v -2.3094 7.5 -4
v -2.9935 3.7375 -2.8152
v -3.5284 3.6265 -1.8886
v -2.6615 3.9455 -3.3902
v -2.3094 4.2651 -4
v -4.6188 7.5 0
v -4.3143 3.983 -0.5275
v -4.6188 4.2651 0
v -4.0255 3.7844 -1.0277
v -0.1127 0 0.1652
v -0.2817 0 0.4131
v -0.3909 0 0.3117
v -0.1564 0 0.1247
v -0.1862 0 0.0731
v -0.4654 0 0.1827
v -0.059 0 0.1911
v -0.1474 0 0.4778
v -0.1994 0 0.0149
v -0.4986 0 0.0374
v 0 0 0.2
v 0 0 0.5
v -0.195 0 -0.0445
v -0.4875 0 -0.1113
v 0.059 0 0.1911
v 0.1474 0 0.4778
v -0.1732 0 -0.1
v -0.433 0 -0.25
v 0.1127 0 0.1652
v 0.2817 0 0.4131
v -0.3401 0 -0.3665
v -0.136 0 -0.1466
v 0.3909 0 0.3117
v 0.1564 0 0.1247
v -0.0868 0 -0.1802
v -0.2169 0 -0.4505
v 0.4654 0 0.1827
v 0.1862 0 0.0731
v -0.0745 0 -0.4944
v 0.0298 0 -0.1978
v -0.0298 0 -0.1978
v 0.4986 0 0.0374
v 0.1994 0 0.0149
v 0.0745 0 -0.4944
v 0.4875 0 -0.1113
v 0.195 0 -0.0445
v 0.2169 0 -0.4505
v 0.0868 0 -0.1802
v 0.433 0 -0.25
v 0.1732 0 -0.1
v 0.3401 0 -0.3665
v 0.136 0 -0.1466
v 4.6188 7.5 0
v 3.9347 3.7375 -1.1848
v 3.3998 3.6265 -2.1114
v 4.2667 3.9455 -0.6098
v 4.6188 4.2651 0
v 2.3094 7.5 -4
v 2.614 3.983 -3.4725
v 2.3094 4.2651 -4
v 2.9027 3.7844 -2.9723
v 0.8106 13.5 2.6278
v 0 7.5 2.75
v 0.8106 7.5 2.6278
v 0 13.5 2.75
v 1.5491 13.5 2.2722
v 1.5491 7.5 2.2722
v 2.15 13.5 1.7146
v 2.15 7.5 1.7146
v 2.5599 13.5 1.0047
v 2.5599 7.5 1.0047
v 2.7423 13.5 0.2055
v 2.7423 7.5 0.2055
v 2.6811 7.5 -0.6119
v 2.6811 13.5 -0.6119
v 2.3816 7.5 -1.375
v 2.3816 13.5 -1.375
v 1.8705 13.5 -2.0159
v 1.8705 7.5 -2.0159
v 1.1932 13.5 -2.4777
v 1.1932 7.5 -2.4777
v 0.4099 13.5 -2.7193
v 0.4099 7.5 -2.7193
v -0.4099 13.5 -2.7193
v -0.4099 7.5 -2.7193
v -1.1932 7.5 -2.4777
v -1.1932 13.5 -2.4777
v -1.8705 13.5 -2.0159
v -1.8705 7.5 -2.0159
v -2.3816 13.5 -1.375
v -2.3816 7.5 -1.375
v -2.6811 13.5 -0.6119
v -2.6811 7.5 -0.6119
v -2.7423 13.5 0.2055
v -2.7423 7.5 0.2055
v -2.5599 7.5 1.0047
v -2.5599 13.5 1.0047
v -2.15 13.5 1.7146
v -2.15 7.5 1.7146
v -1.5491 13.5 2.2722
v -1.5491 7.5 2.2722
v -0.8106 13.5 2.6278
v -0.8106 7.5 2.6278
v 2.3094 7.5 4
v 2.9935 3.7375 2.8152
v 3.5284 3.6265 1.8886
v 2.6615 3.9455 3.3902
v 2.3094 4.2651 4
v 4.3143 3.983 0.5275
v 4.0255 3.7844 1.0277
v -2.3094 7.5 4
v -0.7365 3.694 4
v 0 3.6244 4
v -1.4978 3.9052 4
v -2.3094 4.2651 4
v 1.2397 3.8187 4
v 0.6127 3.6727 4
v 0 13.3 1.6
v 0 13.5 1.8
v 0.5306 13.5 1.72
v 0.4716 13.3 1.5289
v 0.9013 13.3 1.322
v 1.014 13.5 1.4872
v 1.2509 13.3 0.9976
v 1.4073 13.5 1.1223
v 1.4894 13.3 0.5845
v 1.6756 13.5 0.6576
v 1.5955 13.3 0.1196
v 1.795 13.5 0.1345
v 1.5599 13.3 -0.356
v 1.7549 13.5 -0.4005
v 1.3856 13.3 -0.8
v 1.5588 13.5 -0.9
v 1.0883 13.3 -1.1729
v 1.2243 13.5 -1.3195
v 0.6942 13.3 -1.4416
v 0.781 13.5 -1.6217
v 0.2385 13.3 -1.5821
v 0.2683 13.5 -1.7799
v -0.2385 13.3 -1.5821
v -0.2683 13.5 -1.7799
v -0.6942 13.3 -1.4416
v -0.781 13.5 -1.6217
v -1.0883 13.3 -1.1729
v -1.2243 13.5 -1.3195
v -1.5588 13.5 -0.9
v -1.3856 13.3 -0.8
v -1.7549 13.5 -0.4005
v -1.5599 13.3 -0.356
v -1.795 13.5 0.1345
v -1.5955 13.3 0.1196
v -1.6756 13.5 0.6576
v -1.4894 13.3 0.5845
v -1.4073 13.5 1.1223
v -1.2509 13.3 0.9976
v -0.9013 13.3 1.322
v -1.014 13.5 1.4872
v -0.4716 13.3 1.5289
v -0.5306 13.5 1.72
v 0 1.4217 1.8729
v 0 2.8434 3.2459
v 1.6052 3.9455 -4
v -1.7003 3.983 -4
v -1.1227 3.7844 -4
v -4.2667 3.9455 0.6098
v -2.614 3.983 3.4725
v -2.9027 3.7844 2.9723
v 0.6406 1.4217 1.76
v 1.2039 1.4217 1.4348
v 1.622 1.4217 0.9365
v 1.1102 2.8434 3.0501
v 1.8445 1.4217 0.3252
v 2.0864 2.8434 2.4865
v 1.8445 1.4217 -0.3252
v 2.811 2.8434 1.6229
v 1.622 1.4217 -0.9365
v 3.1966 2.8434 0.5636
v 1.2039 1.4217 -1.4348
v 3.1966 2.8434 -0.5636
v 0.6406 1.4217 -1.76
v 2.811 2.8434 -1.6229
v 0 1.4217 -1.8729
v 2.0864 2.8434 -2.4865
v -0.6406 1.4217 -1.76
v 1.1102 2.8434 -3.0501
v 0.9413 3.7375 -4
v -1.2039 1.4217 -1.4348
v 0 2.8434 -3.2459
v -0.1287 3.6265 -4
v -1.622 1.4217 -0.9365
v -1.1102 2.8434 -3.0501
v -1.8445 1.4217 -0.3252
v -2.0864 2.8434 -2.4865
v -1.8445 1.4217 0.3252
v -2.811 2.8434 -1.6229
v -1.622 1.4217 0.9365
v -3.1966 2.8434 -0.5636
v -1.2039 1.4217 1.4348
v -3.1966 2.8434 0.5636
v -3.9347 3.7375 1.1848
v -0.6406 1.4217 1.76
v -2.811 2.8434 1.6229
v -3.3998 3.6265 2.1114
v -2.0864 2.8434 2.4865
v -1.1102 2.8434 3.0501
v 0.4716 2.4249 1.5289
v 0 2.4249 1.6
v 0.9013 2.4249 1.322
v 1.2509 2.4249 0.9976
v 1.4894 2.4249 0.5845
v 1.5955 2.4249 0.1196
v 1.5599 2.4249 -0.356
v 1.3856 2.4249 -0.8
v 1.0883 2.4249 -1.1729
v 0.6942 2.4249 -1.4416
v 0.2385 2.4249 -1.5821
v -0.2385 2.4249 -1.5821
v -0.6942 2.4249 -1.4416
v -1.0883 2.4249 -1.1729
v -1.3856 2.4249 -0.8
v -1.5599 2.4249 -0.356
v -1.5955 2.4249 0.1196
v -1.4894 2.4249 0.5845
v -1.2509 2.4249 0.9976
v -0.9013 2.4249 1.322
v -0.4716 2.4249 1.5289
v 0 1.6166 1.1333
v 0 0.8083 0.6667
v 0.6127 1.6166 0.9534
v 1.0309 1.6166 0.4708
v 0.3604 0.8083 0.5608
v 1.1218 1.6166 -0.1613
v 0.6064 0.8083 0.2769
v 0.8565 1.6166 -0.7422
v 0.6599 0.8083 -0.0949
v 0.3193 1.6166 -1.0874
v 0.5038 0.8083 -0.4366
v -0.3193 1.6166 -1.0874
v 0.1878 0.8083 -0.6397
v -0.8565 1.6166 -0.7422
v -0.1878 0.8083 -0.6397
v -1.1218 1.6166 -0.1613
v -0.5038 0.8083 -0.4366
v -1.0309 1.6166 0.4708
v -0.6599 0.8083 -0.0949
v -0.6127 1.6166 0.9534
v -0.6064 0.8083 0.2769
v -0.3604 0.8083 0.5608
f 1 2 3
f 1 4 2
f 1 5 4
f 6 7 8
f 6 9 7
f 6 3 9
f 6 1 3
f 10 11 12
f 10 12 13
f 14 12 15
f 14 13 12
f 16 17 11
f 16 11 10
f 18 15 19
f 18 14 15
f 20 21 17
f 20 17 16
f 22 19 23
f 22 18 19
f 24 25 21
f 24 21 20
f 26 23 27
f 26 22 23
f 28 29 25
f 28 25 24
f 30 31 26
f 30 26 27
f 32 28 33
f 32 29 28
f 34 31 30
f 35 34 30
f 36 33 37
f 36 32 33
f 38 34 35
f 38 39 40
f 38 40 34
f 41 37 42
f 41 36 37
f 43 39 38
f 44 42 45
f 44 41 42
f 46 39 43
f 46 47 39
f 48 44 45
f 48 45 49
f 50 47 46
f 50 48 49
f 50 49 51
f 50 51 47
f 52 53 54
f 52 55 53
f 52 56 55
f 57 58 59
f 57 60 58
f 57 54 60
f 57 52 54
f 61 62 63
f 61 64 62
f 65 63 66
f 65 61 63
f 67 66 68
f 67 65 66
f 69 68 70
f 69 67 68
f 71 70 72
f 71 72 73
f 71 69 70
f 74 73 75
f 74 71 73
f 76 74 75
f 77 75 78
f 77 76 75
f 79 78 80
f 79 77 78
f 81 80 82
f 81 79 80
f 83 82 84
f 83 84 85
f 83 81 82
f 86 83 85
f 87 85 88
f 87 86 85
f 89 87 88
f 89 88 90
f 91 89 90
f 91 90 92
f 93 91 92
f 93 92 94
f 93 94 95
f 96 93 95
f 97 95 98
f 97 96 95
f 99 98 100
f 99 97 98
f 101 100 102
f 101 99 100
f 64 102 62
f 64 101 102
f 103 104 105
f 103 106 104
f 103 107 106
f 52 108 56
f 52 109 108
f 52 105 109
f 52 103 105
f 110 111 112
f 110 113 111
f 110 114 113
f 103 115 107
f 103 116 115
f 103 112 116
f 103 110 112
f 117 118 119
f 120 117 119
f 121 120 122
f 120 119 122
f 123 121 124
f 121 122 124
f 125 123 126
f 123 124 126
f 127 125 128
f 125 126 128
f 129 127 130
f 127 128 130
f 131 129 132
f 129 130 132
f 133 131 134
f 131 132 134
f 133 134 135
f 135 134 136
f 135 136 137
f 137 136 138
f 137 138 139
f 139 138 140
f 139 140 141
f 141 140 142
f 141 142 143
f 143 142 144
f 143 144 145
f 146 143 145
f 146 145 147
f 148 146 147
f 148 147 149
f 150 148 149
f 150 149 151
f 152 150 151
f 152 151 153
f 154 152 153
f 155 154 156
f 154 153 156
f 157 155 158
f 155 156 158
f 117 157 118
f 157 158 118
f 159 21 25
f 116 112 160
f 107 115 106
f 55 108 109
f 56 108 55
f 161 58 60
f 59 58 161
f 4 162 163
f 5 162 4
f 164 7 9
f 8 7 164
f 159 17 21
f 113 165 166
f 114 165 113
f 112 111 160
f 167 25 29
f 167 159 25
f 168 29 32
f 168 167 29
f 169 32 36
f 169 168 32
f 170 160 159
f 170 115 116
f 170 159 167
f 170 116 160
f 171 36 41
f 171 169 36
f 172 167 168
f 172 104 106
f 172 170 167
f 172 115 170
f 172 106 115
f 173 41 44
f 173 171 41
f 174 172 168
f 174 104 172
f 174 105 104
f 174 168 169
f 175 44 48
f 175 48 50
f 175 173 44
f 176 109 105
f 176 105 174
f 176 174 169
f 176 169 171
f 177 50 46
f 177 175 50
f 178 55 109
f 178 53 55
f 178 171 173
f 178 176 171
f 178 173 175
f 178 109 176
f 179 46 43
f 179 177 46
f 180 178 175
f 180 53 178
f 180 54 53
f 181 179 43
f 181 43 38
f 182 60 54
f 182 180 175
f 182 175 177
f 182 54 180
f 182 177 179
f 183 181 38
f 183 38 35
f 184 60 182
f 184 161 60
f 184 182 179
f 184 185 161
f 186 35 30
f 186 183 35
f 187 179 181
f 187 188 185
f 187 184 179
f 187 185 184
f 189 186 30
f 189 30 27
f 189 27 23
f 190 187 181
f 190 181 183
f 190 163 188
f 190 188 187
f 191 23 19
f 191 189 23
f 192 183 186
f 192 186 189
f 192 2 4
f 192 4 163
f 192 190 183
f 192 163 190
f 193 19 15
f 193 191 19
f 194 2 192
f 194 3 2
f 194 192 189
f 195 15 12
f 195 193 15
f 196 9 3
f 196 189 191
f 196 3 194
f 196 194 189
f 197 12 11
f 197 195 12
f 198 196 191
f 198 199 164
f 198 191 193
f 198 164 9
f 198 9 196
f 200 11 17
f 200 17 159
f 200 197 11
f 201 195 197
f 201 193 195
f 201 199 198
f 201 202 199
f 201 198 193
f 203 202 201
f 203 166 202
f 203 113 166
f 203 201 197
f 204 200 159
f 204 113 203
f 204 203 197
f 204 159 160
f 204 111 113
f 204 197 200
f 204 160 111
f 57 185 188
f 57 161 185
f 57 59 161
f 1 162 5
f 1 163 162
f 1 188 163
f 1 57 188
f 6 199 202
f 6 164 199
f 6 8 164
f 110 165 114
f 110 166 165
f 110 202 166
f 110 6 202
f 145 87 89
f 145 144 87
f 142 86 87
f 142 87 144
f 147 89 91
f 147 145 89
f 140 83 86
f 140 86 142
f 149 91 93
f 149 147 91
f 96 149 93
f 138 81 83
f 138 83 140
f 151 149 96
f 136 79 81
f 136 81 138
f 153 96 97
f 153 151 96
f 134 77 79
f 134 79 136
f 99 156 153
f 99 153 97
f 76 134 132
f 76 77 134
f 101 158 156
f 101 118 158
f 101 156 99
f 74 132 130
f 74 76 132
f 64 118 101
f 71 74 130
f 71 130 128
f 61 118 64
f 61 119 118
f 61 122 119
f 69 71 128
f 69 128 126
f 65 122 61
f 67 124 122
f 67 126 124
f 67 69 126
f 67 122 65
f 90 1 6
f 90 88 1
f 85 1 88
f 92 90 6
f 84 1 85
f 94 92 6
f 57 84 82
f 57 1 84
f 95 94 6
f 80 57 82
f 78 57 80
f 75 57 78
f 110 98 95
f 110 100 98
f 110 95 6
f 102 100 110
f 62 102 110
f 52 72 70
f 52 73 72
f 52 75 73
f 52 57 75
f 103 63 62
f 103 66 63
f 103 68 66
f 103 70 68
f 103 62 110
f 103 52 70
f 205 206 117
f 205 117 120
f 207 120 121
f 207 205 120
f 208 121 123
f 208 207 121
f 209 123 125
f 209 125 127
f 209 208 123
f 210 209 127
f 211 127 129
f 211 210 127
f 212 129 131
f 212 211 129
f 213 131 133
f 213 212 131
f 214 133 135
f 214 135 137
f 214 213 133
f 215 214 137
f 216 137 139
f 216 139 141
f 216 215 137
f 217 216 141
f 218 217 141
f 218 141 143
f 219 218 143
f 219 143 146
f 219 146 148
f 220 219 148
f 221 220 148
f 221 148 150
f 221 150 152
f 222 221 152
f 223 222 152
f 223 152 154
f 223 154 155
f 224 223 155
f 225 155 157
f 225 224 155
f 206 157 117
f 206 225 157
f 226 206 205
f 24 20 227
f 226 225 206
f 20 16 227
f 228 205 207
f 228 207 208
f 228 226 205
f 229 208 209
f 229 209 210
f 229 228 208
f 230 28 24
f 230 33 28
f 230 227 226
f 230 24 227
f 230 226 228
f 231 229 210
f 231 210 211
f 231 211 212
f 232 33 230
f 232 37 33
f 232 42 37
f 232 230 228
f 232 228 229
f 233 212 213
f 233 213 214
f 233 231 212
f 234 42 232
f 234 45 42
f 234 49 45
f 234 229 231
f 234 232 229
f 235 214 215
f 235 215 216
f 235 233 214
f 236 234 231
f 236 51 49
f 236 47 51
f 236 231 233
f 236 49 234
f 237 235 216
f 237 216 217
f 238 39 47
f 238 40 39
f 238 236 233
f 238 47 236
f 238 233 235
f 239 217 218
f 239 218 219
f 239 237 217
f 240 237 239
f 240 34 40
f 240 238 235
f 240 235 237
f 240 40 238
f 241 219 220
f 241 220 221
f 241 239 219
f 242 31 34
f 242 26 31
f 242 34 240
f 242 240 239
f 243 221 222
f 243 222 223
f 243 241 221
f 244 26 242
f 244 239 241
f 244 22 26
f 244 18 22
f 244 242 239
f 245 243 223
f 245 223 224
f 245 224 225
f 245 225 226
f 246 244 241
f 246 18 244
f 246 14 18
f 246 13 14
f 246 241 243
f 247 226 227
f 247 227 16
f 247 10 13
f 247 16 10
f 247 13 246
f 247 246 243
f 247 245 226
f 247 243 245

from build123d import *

# Parameters (mm, degrees)
CROQUIS2_R            = 7.742665811
CORTAR_EXTRUIR1_DEPTH = 14.272066445
CHAFL_N1_SIZE         = 0.2


with BuildPart() as part:
    # Croquis1 → Revolución1 (revolve)
    with BuildSketch(Plane.XY, mode=Mode.PRIVATE) as revoluci_n1_sk:
        Polygon((0.2, 0), (0.5, 0), (7.742665811, 7.5), (2.75, 7.5), (2.75, 13.5), (1.6, 13.5), (1.6, 2.424871131), align=None)
    revolve(revoluci_n1_sk.sketch.rotate(Axis((0, 0, 0), (0, 1, 0)), 270), axis=Axis((0, 0, 0), (0, 1, 0)))

    # Croquis2 → Cortar-Extruir1 (cut, through all)
    with BuildSketch(Plane(origin=(0, 7.5, 0), x_dir=(1, 0, 0), z_dir=(0, 1, 0))):
        Circle(CROQUIS2_R)
        Polygon((2.309401077, 4), (-2.309401077, 4), (-4.618802154, 0), (-2.309401077, -4), (2.309401077, -4), (4.618802154, 0), align=None, mode=Mode.SUBTRACT)
    extrude(amount=-CORTAR_EXTRUIR1_DEPTH, mode=Mode.SUBTRACT)

    # Chaflán1
    chafl_n1_edges = [part.edges().sort_by_distance(p)[0] for p in [
        (0, 13.5, -1.6),
    ]]
    chamfer(chafl_n1_edges, length=CHAFL_N1_SIZE)


solid = part.part
